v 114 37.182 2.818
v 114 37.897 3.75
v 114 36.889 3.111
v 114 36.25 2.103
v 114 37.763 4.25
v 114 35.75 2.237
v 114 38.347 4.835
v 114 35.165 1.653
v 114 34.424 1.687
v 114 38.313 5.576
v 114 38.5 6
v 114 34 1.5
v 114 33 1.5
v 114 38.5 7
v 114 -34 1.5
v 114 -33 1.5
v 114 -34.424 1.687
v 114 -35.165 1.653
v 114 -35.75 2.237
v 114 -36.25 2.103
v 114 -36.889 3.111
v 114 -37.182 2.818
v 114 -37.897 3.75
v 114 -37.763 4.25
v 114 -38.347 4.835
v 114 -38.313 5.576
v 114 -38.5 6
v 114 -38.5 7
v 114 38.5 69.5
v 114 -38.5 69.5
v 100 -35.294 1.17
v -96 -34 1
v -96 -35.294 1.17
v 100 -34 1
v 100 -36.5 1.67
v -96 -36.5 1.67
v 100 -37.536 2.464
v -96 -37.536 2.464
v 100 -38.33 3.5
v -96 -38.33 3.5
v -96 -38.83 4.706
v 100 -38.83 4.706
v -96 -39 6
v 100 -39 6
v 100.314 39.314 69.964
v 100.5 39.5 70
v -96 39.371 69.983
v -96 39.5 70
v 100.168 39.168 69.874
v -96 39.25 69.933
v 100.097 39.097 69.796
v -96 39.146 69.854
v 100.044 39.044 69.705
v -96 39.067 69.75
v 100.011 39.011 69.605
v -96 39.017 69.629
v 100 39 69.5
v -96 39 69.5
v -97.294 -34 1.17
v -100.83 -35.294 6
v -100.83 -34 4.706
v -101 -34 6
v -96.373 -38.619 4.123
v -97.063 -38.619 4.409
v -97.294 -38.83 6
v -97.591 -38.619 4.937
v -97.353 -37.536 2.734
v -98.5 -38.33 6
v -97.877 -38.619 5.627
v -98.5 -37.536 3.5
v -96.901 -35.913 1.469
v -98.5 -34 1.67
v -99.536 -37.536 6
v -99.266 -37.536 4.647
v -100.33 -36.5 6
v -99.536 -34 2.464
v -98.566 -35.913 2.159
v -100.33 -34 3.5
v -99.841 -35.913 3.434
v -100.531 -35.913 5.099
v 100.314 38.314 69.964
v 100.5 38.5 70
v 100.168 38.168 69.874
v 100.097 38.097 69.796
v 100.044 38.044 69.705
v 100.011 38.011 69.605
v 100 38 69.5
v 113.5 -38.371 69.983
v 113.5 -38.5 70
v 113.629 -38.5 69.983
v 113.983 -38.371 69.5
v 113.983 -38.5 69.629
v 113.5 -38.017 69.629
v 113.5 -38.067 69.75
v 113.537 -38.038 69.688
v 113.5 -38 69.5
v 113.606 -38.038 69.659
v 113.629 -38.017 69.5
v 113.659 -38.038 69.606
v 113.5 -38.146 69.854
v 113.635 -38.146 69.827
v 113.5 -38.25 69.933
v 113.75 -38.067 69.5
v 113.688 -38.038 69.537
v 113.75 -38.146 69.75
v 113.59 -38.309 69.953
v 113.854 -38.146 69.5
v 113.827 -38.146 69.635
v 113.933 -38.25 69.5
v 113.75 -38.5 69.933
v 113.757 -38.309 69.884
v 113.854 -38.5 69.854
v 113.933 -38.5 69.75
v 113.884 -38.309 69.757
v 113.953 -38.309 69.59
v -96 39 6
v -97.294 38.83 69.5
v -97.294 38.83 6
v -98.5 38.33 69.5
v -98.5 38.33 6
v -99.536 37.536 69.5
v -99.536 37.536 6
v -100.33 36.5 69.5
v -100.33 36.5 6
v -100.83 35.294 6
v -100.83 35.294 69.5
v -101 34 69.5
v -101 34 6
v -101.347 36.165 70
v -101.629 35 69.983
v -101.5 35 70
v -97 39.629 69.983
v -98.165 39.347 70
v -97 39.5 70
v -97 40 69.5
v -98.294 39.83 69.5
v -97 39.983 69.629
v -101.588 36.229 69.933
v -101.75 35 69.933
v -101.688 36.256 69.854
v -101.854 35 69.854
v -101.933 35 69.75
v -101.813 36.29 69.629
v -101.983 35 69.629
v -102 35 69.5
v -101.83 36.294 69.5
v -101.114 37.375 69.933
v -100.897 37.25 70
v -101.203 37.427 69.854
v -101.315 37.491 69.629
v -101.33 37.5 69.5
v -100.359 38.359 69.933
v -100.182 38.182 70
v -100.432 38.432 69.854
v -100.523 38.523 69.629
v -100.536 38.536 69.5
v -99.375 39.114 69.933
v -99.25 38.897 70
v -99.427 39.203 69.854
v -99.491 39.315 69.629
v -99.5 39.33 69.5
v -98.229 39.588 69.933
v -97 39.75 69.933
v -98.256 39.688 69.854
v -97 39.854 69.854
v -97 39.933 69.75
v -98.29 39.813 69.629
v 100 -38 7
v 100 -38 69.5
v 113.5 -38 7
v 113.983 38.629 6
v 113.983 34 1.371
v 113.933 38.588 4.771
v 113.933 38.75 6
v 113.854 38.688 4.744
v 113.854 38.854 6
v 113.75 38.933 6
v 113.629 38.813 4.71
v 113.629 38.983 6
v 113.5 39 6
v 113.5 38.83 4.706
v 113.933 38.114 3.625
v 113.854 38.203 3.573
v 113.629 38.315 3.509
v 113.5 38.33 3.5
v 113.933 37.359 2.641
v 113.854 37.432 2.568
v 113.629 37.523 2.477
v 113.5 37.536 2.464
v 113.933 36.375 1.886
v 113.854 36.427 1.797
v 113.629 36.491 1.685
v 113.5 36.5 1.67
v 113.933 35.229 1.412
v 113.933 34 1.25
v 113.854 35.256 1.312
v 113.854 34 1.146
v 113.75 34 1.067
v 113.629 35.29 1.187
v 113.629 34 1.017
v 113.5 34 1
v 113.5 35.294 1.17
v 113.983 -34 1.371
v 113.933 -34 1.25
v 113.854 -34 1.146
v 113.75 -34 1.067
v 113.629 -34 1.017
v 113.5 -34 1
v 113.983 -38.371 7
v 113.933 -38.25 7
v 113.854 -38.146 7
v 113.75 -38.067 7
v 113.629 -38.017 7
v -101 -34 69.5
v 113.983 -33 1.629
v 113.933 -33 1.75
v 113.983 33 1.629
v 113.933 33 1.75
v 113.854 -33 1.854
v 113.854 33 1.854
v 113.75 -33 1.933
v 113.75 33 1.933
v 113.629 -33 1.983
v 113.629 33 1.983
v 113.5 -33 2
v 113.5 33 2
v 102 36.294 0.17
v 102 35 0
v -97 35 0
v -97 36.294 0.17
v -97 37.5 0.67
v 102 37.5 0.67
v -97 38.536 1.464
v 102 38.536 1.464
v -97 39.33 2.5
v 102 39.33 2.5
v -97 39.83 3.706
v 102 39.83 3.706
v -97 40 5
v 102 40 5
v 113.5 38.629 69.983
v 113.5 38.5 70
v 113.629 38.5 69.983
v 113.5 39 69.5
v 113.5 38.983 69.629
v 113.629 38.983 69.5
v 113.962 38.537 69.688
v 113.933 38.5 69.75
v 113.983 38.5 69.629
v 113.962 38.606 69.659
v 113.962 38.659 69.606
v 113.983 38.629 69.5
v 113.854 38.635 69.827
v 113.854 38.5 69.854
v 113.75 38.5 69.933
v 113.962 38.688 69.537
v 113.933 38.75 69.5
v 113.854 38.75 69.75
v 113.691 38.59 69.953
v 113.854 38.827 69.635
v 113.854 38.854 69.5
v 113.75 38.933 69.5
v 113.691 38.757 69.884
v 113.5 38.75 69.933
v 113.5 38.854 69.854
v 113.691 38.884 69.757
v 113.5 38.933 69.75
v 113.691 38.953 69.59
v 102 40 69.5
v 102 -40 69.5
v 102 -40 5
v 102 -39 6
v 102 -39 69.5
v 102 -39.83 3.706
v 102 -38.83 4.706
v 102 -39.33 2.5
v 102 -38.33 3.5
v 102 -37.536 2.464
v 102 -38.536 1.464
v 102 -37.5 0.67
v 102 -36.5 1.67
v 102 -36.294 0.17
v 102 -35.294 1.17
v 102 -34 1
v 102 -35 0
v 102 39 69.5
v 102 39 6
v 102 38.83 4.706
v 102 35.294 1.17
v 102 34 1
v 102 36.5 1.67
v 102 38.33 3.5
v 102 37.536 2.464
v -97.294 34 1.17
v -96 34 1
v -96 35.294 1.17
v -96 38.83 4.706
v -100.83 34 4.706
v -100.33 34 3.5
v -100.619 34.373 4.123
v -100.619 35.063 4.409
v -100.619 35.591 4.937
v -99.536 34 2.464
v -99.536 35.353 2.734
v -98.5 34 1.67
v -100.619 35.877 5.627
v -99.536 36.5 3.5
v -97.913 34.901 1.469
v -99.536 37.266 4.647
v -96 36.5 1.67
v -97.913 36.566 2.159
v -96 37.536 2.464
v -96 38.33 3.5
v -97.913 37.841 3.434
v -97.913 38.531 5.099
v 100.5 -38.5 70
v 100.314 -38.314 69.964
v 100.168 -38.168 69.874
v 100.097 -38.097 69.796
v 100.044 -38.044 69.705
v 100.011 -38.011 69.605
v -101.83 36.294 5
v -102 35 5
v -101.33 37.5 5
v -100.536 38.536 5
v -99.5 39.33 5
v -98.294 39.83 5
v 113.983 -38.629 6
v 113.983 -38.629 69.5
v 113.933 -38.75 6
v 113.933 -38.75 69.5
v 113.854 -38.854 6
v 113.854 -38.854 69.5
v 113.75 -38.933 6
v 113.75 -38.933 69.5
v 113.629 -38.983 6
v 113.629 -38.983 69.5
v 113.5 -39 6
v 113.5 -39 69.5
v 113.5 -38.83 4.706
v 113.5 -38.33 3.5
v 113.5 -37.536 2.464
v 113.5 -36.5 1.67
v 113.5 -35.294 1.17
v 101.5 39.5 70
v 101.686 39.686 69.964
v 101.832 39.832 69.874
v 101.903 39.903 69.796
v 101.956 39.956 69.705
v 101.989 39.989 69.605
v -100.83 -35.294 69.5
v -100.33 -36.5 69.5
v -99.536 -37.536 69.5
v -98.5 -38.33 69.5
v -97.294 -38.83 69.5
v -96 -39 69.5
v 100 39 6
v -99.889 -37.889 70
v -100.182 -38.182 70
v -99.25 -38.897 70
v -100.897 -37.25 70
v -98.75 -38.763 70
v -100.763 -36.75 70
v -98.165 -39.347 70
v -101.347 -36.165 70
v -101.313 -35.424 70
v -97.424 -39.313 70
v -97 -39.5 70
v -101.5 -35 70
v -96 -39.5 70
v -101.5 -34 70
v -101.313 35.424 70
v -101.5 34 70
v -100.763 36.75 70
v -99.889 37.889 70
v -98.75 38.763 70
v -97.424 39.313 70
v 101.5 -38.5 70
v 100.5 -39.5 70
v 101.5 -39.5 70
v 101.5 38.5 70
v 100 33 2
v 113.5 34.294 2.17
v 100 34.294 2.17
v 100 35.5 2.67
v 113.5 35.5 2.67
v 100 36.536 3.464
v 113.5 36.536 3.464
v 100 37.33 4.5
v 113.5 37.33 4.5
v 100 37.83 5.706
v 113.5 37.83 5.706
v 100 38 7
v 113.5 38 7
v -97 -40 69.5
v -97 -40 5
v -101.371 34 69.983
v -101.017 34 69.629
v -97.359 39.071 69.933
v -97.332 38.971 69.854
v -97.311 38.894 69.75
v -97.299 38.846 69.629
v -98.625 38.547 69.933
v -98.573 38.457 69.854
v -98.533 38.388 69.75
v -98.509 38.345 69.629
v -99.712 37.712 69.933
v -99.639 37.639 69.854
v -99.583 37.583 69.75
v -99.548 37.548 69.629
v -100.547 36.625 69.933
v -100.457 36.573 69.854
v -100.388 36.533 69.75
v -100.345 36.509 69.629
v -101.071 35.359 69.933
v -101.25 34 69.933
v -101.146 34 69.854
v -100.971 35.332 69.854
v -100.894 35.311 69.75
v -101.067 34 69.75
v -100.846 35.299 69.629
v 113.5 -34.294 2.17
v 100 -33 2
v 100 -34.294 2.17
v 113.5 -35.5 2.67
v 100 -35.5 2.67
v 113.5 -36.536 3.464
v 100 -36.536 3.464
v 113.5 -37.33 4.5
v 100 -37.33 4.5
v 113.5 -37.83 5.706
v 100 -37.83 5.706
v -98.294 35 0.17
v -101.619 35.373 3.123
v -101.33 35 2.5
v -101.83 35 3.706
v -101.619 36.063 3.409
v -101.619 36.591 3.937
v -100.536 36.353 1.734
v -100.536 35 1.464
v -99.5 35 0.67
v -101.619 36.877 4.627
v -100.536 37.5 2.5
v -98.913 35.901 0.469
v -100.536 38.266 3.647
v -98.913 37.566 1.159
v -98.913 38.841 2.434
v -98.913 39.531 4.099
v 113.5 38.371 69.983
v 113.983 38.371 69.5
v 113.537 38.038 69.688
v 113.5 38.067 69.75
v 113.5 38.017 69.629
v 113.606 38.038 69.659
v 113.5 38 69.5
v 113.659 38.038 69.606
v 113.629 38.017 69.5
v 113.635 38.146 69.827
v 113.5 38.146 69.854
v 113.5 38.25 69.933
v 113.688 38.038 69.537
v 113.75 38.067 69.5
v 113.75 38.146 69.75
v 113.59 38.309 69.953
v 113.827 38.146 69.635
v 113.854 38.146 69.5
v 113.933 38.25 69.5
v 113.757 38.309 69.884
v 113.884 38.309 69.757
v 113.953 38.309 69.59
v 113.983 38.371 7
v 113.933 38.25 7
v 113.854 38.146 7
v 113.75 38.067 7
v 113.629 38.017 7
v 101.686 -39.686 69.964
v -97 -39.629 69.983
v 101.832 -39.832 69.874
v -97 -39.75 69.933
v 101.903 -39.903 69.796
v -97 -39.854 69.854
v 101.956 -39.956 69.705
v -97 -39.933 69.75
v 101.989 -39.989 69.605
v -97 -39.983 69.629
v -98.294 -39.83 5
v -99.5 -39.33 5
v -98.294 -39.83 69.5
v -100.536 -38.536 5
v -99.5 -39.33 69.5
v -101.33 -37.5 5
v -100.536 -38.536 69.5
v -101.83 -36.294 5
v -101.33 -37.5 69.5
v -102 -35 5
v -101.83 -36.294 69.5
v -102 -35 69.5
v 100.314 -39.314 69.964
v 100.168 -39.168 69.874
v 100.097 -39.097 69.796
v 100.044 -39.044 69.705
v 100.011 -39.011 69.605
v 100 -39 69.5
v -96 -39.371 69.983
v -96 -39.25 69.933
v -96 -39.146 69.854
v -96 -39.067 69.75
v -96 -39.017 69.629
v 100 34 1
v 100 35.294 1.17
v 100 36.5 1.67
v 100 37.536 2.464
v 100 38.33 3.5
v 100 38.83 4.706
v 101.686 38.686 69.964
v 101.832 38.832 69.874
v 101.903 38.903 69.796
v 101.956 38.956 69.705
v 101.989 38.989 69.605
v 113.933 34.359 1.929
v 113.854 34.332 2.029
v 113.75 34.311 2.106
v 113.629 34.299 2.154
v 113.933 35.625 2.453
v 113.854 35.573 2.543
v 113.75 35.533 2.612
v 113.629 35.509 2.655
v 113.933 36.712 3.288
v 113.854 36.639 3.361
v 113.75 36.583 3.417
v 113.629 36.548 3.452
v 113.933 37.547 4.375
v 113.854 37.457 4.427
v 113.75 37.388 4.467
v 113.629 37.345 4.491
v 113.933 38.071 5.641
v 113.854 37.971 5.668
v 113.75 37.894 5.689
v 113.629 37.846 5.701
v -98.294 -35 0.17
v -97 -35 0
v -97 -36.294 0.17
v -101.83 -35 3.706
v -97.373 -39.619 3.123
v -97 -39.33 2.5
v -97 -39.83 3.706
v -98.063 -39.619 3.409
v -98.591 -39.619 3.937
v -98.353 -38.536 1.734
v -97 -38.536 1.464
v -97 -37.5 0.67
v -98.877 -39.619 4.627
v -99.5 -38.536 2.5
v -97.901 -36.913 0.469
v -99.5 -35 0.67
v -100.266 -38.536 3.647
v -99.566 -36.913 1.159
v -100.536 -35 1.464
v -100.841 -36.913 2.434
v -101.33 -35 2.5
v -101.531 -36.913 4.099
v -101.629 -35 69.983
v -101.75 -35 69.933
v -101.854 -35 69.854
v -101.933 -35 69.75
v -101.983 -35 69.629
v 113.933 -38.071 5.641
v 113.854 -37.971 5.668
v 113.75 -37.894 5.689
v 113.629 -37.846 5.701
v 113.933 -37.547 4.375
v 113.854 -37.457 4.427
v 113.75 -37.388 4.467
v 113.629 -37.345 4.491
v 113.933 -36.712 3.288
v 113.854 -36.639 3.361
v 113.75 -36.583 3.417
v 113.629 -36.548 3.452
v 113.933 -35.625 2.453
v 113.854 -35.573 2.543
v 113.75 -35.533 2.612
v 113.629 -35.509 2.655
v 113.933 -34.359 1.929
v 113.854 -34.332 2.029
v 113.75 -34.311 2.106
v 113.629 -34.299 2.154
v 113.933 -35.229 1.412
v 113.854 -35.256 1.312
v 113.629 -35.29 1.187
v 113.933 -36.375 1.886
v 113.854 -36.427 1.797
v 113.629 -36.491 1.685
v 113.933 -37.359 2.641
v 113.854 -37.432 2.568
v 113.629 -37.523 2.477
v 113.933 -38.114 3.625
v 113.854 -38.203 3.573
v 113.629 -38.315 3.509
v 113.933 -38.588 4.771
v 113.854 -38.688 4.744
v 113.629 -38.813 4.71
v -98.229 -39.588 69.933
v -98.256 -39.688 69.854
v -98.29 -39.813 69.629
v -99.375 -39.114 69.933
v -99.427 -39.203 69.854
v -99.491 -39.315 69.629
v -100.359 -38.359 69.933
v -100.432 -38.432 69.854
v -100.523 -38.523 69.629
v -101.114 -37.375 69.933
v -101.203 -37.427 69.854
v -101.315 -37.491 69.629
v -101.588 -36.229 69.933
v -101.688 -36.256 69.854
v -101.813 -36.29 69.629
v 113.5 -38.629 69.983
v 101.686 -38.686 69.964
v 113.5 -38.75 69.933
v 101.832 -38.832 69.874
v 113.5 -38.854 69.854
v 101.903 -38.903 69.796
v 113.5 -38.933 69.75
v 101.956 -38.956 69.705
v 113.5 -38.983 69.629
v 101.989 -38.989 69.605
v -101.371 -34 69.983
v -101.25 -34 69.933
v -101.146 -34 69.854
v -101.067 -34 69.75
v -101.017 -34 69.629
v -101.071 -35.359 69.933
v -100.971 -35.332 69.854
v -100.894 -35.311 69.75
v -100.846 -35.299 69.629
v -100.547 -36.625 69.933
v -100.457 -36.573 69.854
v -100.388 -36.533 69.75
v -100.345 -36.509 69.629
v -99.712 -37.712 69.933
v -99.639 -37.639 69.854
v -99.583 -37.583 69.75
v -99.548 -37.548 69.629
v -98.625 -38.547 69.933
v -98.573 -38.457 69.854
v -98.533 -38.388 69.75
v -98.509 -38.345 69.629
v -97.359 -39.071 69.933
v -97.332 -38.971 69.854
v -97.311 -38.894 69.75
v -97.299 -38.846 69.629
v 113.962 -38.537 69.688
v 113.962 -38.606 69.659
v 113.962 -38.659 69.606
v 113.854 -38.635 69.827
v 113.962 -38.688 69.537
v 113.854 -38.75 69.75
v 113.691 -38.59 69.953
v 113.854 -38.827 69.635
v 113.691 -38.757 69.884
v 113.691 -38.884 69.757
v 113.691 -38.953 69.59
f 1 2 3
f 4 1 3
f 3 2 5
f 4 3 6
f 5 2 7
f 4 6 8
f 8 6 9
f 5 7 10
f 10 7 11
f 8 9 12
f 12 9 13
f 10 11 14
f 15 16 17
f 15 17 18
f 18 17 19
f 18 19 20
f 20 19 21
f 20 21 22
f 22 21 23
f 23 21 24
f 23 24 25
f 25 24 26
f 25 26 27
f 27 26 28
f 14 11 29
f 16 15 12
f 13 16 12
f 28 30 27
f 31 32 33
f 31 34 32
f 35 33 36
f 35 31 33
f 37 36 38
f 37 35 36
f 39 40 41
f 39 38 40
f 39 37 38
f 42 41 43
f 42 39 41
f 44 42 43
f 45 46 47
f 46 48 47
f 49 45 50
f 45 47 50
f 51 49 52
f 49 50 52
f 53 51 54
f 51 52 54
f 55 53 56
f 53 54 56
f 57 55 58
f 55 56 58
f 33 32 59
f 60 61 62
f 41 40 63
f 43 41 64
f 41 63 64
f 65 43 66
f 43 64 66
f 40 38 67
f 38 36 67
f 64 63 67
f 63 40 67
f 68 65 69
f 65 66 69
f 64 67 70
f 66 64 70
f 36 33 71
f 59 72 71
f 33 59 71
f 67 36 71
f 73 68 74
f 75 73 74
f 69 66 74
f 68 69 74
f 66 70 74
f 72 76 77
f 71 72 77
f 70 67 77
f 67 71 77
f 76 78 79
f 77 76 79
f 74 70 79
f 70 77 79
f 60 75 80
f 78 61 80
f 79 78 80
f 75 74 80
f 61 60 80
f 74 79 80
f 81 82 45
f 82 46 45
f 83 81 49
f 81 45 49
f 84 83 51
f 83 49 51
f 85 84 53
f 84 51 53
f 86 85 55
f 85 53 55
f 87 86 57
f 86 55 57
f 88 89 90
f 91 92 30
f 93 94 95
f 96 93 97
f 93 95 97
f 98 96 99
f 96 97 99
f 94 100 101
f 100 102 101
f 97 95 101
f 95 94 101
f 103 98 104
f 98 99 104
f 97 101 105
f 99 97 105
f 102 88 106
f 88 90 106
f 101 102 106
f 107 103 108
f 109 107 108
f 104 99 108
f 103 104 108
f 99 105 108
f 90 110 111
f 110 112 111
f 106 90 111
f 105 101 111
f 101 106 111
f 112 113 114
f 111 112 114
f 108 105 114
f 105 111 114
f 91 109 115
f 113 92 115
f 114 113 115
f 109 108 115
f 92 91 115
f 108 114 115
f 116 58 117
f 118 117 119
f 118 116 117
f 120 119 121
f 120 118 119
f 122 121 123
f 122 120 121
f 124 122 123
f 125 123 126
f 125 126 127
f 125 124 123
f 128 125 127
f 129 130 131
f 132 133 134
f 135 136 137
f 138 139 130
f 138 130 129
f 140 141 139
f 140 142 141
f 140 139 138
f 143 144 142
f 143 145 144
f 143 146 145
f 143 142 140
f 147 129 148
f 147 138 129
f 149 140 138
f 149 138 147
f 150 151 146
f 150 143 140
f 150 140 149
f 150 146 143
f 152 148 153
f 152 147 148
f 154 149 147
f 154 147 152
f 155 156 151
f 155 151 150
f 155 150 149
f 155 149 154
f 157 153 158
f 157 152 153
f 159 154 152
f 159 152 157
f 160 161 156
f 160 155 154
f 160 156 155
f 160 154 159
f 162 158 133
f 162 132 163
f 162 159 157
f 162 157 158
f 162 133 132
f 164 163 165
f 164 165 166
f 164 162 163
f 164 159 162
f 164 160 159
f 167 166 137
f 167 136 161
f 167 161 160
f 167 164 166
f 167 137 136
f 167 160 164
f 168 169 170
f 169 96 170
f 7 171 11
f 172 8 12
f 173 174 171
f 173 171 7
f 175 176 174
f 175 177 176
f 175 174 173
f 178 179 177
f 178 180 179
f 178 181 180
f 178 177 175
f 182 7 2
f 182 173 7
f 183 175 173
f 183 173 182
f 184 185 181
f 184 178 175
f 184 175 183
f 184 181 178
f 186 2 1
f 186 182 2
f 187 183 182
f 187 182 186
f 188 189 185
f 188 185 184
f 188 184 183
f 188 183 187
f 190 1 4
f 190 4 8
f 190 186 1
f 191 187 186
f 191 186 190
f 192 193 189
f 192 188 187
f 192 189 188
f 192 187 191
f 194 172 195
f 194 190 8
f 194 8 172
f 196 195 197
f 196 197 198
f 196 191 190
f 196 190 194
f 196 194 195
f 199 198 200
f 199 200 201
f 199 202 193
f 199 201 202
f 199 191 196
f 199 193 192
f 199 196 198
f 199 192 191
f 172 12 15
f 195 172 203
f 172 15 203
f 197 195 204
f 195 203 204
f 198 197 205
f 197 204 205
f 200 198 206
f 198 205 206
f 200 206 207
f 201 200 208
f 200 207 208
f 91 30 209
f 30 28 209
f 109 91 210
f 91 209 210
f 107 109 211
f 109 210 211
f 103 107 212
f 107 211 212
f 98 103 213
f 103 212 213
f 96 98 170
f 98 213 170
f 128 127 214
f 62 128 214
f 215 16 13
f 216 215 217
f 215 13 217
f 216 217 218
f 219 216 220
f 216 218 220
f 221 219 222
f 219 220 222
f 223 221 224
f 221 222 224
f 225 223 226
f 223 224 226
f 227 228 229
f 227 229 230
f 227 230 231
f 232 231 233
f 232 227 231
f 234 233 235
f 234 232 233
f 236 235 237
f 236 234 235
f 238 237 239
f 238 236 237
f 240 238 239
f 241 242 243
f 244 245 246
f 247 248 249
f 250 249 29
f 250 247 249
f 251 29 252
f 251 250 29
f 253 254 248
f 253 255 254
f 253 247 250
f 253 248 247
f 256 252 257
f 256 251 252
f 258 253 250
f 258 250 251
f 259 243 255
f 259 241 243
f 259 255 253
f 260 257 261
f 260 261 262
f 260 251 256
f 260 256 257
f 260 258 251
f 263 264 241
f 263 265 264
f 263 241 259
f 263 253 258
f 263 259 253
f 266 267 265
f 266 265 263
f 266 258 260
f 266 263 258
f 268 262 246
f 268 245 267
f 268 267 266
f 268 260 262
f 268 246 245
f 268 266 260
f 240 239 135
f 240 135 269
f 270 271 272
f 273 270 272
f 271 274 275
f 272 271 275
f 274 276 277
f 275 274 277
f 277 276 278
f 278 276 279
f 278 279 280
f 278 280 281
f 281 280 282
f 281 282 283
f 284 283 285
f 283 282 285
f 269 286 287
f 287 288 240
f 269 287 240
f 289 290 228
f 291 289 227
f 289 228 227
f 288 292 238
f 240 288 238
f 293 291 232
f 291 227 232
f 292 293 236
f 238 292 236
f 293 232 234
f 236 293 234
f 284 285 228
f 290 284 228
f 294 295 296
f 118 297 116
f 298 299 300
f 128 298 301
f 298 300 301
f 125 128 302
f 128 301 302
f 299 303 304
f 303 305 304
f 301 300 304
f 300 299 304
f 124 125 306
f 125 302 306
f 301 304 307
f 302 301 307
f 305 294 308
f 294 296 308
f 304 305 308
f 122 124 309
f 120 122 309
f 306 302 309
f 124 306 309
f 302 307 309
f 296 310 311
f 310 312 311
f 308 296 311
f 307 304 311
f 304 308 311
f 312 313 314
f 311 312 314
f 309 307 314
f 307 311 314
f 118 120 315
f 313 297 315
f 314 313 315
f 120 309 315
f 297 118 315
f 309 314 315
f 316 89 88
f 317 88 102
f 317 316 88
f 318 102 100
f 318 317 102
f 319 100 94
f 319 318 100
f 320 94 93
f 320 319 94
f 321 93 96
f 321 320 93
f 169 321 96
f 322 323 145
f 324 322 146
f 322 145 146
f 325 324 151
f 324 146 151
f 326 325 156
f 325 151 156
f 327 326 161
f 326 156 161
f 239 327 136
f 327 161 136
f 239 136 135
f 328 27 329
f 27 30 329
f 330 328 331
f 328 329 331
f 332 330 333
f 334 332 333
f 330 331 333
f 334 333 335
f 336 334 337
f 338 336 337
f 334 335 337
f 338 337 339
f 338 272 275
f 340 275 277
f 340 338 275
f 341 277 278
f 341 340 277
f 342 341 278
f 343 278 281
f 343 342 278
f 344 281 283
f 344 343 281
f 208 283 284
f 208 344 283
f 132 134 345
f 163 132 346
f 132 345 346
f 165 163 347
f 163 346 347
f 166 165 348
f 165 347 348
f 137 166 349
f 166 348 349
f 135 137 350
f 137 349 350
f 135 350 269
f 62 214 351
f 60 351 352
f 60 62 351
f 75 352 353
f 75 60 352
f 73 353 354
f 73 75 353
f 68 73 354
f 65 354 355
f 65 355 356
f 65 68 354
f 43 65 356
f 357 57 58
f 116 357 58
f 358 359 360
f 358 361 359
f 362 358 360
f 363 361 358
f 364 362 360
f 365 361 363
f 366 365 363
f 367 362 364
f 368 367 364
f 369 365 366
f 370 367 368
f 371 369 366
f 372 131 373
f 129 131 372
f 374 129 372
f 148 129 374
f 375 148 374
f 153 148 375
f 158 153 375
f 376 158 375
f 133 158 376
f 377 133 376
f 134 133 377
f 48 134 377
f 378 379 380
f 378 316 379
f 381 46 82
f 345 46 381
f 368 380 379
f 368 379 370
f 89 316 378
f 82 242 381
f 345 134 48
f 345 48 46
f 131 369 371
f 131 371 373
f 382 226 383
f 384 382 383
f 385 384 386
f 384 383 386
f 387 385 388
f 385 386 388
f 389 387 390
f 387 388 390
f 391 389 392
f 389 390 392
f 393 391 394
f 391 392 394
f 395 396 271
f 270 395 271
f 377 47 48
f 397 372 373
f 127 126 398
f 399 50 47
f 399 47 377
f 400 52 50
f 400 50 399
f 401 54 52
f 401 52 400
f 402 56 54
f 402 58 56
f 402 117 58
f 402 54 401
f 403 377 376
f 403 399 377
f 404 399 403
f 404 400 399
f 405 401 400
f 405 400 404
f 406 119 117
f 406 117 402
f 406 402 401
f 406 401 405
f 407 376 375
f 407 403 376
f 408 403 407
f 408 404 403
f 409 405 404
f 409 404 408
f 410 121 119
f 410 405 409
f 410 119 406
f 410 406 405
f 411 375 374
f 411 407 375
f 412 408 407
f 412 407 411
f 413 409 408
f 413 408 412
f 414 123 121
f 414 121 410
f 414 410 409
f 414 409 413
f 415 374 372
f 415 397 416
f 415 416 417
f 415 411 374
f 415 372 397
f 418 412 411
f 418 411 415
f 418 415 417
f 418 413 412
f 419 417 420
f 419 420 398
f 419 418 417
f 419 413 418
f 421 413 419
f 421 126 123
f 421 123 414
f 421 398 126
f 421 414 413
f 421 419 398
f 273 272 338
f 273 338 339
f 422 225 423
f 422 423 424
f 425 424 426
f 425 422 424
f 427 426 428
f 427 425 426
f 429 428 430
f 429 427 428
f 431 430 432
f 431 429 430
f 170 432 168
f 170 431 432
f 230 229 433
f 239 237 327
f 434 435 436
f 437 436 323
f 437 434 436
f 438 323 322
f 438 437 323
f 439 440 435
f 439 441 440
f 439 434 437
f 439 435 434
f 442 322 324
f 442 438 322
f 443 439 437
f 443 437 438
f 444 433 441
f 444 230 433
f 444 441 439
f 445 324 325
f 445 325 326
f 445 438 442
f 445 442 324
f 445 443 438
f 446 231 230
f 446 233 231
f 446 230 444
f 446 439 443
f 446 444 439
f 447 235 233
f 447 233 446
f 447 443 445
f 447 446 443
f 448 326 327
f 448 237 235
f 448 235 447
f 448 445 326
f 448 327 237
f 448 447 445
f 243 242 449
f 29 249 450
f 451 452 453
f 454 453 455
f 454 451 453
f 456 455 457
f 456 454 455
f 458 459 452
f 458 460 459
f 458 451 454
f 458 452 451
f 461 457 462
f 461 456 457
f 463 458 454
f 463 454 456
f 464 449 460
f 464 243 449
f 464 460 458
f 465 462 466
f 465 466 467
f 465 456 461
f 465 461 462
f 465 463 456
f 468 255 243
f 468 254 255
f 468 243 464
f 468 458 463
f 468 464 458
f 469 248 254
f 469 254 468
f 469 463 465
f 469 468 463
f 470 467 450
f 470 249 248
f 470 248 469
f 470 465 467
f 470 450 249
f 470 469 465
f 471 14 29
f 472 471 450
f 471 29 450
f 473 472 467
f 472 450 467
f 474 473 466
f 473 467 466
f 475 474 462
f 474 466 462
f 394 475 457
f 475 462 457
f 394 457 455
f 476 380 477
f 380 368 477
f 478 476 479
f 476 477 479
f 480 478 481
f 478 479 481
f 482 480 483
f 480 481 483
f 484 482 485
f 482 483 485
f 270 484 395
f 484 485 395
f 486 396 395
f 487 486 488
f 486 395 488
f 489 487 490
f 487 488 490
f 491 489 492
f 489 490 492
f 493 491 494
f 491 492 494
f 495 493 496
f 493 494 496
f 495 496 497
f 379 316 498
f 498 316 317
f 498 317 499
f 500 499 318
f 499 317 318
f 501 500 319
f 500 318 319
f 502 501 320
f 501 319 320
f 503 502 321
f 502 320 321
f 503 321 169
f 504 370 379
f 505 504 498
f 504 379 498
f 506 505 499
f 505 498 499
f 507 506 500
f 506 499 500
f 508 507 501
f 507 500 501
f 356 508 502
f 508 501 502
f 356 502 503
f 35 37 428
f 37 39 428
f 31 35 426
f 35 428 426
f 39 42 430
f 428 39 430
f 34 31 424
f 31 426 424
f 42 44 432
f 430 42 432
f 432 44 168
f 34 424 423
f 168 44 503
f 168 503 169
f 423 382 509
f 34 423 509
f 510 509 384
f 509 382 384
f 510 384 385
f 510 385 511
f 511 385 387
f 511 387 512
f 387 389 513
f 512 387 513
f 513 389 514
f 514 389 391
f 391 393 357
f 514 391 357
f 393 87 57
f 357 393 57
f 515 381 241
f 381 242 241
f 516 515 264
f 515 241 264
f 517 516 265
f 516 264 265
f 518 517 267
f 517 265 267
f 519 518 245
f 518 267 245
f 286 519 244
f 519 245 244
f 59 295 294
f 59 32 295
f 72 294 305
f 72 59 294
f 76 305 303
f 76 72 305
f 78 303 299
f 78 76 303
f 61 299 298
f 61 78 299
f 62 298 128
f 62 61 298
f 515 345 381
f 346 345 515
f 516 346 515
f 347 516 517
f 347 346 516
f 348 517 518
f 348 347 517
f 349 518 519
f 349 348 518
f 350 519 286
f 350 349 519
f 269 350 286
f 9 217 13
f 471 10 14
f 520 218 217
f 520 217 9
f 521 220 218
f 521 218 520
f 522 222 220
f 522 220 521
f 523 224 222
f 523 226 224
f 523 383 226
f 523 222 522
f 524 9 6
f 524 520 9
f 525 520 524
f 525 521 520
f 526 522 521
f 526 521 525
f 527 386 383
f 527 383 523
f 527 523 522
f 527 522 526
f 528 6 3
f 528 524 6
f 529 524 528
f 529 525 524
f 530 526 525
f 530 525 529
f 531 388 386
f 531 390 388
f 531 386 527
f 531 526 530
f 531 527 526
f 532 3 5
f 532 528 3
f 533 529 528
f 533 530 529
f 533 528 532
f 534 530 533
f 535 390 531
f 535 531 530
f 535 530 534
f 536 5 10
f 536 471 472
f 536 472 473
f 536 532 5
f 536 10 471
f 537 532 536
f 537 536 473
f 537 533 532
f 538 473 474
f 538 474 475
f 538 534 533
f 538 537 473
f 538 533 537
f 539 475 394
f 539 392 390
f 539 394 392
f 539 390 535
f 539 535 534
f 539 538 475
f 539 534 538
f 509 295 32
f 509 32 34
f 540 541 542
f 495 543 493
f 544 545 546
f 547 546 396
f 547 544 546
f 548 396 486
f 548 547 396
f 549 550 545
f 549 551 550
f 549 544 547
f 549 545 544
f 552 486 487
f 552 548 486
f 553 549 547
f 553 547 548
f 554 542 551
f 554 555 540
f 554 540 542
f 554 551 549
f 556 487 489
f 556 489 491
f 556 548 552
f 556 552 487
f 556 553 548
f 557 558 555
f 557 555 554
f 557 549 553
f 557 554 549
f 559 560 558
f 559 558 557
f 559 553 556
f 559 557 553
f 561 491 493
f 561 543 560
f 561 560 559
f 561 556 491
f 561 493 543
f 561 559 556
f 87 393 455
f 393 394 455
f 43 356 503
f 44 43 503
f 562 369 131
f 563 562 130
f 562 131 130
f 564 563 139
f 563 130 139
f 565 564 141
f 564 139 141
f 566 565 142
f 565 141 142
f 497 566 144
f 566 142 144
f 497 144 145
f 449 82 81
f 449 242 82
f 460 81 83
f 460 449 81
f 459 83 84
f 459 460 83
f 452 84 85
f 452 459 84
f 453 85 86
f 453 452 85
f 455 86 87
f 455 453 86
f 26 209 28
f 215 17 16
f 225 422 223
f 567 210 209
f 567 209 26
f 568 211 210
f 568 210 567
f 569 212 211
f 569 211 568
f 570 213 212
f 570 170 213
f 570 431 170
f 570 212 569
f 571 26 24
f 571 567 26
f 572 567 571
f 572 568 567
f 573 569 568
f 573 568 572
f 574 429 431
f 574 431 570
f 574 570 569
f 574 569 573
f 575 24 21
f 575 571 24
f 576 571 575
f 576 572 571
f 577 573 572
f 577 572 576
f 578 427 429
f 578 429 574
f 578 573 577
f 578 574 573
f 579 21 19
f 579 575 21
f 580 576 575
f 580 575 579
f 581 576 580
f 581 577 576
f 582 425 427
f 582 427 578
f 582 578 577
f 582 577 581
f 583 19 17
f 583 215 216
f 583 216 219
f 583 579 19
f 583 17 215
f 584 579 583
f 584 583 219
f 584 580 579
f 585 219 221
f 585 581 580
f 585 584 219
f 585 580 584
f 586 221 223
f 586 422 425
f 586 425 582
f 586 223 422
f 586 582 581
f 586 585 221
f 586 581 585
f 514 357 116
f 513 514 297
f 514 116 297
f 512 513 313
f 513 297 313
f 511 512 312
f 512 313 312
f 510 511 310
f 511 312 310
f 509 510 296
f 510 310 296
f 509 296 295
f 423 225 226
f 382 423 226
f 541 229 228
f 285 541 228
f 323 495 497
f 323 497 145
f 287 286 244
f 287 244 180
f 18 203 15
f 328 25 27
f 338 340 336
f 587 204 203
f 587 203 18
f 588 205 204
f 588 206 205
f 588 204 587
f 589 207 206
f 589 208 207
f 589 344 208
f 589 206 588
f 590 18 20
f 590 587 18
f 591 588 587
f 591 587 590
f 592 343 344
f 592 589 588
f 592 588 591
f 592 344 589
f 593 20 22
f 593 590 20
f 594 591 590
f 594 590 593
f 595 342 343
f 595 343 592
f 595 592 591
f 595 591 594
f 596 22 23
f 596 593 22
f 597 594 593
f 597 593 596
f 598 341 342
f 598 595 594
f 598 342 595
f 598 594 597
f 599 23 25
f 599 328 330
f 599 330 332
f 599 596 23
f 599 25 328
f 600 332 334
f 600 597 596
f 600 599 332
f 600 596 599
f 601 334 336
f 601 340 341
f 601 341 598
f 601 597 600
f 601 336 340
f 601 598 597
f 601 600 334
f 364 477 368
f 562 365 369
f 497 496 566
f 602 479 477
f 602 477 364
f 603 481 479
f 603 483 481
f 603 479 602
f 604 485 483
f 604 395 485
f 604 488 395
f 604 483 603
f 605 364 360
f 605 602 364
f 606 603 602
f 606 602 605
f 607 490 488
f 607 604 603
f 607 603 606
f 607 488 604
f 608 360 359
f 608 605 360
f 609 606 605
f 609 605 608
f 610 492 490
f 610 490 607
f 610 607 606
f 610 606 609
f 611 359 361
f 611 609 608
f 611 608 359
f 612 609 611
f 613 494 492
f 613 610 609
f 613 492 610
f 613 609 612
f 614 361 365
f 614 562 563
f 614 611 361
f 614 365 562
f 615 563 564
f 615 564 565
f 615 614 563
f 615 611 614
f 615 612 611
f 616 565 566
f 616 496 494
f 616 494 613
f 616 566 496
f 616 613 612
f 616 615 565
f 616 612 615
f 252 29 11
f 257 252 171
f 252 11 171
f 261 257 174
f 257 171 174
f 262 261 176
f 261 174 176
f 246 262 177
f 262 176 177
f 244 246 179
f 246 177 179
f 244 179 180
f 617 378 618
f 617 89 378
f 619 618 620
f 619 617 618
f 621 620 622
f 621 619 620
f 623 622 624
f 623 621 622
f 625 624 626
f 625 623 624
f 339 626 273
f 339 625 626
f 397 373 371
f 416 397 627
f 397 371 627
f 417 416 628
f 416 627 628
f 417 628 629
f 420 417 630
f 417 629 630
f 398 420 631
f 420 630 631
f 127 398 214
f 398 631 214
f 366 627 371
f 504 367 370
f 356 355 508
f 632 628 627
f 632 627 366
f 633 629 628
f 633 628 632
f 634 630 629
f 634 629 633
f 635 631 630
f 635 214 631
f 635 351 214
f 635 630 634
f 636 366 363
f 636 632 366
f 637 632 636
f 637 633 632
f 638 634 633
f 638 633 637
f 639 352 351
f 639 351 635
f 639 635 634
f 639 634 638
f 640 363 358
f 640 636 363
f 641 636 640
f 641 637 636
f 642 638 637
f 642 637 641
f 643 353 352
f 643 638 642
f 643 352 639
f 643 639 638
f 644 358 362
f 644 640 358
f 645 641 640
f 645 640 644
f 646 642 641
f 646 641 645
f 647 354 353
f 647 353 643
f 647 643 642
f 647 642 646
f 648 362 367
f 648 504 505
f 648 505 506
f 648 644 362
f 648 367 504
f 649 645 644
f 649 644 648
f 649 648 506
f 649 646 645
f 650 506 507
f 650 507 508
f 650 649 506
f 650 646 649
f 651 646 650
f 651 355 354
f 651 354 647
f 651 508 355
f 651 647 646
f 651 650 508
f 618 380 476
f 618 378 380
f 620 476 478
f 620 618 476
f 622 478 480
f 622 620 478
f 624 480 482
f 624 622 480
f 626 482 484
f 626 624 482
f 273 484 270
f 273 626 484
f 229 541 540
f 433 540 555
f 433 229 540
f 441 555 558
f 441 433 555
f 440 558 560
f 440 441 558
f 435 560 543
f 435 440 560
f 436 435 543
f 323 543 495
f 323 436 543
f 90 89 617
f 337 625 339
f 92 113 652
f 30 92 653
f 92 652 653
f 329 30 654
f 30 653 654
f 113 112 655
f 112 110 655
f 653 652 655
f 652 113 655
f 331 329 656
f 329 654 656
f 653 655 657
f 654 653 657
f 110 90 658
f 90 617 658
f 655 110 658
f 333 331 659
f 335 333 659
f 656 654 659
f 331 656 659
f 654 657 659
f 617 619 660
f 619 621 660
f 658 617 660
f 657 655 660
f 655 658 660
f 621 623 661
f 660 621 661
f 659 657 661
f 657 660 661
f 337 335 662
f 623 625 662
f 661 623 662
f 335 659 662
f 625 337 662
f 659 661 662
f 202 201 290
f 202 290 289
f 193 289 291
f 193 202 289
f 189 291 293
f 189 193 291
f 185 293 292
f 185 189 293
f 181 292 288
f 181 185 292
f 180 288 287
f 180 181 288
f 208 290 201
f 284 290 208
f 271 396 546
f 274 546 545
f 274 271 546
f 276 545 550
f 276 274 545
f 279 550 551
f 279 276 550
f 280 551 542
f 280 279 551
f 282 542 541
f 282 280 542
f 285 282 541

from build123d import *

# Parameters (mm, degrees)
F0_W     = 204
F0_H     = 80
F1_DEPTH = 70
F3_DEPTH = 69
F5_DEPTH = 2
F7_DEPTH = 14
F8_R     = 5
F9_R     = 0.49999


# Not quite as in the source:
# - a fillet or chamfer is up to 0.001 mm smaller than in the source, because OpenCascade refuses the exact size


with BuildPart() as f1:
    # F0 (on Top) → F1 (new body)
    with BuildSketch(Plane.XY):
        Rectangle(F0_W, F0_H)
    extrude(amount=F1_DEPTH)

    # F2 (on face) → F3 (cut)
    with BuildSketch(Plane.XY.offset(70)):
        Polygon((-70.4128742218, 39), (-101, 39), (-101, 20.586034283), (-101, -39), (-57.7337481081, -39), (100, -39), (100, -8.4424866363), (100, 39), align=None)
    extrude(amount=-F3_DEPTH, mode=Mode.SUBTRACT)

    # F4 (on face) → F5 (cut)
    with BuildSketch(Plane.YZ.offset(102)):
        Polygon((38, 2), (38, 70), (-38, 70), (-38, 42.2970801592), (-38, 2), align=None)
    extrude(amount=-F5_DEPTH, mode=Mode.SUBTRACT)

    # F6 (on face) → F7 (join)
    with BuildSketch(Plane(origin=(100, 0, 0), x_dir=(0, -1, 0), z_dir=(-1, 0, 0))):
        Polygon((39, 1), (39, 70), (38, 70), (38, 2), (-38, 2), (-38, 70), (-39, 70), (-39, 1), align=None)
    extrude(amount=-F7_DEPTH)

    # F8
    f8_edges = [f1.edges().sort_by_distance(p)[0] for p in [
        (-0.5, 39, 1),
        (-101, 0, 1),
        (-0.5, -39, 1),
        (0, 40, 0),
        (-102, 0, 0),
        (0, -40, 0),
        (-102, -40, 35),
        (-102, 40, 35),
        (-101, 39, 35.5),
        (-101, -39, 35.5),
        (108, 39, 1),
        (108, -39, 1),
        (107, -38, 2),
        (107, 38, 2),
    ]]
    fillet(f8_edges, radius=F8_R)

    # F9 (radius 0.5 in the source; OpenCascade refuses exactly that, so slightly less here)
    f9_edges = [f1.edges().sort_by_distance(p)[0] for p in [
        (2.5, 40, 70),
        (-100.535534, 38.535534, 70),
        (102, 39.5, 70),
        (-102, 0, 70),
        (108, 39, 70),
        (-100.535534, -38.535534, 70),
        (114, 38.5, 70),
        (2.5, -40, 70),
        (107, 38, 70),
        (102, -39.5, 70),
        (100, 38.5, 70),
        (108, -39, 70),
        (2, 39, 70),
        (114, -38.5, 70),
        (-99.535534, 37.535534, 70),
        (107, -38, 70),
        (-101, 0, 70),
        (100, -38.5, 70),
        (-99.535534, -37.535534, 70),
        (2, -39, 70),
        (114, -39, 38),
        (114, -37.535534, 2.464466),
        (114, 0, 1),
        (114, -38, 38.5),
        (114, 37.535534, 2.464466),
        (114, -36.535534, 3.464466),
        (114, 39, 38),
        (114, 0, 2),
        (114, 36.535534, 3.464466),
        (114, 38, 38.5),
    ]]
    fillet(f9_edges, radius=F9_R)


solid = f1.part
